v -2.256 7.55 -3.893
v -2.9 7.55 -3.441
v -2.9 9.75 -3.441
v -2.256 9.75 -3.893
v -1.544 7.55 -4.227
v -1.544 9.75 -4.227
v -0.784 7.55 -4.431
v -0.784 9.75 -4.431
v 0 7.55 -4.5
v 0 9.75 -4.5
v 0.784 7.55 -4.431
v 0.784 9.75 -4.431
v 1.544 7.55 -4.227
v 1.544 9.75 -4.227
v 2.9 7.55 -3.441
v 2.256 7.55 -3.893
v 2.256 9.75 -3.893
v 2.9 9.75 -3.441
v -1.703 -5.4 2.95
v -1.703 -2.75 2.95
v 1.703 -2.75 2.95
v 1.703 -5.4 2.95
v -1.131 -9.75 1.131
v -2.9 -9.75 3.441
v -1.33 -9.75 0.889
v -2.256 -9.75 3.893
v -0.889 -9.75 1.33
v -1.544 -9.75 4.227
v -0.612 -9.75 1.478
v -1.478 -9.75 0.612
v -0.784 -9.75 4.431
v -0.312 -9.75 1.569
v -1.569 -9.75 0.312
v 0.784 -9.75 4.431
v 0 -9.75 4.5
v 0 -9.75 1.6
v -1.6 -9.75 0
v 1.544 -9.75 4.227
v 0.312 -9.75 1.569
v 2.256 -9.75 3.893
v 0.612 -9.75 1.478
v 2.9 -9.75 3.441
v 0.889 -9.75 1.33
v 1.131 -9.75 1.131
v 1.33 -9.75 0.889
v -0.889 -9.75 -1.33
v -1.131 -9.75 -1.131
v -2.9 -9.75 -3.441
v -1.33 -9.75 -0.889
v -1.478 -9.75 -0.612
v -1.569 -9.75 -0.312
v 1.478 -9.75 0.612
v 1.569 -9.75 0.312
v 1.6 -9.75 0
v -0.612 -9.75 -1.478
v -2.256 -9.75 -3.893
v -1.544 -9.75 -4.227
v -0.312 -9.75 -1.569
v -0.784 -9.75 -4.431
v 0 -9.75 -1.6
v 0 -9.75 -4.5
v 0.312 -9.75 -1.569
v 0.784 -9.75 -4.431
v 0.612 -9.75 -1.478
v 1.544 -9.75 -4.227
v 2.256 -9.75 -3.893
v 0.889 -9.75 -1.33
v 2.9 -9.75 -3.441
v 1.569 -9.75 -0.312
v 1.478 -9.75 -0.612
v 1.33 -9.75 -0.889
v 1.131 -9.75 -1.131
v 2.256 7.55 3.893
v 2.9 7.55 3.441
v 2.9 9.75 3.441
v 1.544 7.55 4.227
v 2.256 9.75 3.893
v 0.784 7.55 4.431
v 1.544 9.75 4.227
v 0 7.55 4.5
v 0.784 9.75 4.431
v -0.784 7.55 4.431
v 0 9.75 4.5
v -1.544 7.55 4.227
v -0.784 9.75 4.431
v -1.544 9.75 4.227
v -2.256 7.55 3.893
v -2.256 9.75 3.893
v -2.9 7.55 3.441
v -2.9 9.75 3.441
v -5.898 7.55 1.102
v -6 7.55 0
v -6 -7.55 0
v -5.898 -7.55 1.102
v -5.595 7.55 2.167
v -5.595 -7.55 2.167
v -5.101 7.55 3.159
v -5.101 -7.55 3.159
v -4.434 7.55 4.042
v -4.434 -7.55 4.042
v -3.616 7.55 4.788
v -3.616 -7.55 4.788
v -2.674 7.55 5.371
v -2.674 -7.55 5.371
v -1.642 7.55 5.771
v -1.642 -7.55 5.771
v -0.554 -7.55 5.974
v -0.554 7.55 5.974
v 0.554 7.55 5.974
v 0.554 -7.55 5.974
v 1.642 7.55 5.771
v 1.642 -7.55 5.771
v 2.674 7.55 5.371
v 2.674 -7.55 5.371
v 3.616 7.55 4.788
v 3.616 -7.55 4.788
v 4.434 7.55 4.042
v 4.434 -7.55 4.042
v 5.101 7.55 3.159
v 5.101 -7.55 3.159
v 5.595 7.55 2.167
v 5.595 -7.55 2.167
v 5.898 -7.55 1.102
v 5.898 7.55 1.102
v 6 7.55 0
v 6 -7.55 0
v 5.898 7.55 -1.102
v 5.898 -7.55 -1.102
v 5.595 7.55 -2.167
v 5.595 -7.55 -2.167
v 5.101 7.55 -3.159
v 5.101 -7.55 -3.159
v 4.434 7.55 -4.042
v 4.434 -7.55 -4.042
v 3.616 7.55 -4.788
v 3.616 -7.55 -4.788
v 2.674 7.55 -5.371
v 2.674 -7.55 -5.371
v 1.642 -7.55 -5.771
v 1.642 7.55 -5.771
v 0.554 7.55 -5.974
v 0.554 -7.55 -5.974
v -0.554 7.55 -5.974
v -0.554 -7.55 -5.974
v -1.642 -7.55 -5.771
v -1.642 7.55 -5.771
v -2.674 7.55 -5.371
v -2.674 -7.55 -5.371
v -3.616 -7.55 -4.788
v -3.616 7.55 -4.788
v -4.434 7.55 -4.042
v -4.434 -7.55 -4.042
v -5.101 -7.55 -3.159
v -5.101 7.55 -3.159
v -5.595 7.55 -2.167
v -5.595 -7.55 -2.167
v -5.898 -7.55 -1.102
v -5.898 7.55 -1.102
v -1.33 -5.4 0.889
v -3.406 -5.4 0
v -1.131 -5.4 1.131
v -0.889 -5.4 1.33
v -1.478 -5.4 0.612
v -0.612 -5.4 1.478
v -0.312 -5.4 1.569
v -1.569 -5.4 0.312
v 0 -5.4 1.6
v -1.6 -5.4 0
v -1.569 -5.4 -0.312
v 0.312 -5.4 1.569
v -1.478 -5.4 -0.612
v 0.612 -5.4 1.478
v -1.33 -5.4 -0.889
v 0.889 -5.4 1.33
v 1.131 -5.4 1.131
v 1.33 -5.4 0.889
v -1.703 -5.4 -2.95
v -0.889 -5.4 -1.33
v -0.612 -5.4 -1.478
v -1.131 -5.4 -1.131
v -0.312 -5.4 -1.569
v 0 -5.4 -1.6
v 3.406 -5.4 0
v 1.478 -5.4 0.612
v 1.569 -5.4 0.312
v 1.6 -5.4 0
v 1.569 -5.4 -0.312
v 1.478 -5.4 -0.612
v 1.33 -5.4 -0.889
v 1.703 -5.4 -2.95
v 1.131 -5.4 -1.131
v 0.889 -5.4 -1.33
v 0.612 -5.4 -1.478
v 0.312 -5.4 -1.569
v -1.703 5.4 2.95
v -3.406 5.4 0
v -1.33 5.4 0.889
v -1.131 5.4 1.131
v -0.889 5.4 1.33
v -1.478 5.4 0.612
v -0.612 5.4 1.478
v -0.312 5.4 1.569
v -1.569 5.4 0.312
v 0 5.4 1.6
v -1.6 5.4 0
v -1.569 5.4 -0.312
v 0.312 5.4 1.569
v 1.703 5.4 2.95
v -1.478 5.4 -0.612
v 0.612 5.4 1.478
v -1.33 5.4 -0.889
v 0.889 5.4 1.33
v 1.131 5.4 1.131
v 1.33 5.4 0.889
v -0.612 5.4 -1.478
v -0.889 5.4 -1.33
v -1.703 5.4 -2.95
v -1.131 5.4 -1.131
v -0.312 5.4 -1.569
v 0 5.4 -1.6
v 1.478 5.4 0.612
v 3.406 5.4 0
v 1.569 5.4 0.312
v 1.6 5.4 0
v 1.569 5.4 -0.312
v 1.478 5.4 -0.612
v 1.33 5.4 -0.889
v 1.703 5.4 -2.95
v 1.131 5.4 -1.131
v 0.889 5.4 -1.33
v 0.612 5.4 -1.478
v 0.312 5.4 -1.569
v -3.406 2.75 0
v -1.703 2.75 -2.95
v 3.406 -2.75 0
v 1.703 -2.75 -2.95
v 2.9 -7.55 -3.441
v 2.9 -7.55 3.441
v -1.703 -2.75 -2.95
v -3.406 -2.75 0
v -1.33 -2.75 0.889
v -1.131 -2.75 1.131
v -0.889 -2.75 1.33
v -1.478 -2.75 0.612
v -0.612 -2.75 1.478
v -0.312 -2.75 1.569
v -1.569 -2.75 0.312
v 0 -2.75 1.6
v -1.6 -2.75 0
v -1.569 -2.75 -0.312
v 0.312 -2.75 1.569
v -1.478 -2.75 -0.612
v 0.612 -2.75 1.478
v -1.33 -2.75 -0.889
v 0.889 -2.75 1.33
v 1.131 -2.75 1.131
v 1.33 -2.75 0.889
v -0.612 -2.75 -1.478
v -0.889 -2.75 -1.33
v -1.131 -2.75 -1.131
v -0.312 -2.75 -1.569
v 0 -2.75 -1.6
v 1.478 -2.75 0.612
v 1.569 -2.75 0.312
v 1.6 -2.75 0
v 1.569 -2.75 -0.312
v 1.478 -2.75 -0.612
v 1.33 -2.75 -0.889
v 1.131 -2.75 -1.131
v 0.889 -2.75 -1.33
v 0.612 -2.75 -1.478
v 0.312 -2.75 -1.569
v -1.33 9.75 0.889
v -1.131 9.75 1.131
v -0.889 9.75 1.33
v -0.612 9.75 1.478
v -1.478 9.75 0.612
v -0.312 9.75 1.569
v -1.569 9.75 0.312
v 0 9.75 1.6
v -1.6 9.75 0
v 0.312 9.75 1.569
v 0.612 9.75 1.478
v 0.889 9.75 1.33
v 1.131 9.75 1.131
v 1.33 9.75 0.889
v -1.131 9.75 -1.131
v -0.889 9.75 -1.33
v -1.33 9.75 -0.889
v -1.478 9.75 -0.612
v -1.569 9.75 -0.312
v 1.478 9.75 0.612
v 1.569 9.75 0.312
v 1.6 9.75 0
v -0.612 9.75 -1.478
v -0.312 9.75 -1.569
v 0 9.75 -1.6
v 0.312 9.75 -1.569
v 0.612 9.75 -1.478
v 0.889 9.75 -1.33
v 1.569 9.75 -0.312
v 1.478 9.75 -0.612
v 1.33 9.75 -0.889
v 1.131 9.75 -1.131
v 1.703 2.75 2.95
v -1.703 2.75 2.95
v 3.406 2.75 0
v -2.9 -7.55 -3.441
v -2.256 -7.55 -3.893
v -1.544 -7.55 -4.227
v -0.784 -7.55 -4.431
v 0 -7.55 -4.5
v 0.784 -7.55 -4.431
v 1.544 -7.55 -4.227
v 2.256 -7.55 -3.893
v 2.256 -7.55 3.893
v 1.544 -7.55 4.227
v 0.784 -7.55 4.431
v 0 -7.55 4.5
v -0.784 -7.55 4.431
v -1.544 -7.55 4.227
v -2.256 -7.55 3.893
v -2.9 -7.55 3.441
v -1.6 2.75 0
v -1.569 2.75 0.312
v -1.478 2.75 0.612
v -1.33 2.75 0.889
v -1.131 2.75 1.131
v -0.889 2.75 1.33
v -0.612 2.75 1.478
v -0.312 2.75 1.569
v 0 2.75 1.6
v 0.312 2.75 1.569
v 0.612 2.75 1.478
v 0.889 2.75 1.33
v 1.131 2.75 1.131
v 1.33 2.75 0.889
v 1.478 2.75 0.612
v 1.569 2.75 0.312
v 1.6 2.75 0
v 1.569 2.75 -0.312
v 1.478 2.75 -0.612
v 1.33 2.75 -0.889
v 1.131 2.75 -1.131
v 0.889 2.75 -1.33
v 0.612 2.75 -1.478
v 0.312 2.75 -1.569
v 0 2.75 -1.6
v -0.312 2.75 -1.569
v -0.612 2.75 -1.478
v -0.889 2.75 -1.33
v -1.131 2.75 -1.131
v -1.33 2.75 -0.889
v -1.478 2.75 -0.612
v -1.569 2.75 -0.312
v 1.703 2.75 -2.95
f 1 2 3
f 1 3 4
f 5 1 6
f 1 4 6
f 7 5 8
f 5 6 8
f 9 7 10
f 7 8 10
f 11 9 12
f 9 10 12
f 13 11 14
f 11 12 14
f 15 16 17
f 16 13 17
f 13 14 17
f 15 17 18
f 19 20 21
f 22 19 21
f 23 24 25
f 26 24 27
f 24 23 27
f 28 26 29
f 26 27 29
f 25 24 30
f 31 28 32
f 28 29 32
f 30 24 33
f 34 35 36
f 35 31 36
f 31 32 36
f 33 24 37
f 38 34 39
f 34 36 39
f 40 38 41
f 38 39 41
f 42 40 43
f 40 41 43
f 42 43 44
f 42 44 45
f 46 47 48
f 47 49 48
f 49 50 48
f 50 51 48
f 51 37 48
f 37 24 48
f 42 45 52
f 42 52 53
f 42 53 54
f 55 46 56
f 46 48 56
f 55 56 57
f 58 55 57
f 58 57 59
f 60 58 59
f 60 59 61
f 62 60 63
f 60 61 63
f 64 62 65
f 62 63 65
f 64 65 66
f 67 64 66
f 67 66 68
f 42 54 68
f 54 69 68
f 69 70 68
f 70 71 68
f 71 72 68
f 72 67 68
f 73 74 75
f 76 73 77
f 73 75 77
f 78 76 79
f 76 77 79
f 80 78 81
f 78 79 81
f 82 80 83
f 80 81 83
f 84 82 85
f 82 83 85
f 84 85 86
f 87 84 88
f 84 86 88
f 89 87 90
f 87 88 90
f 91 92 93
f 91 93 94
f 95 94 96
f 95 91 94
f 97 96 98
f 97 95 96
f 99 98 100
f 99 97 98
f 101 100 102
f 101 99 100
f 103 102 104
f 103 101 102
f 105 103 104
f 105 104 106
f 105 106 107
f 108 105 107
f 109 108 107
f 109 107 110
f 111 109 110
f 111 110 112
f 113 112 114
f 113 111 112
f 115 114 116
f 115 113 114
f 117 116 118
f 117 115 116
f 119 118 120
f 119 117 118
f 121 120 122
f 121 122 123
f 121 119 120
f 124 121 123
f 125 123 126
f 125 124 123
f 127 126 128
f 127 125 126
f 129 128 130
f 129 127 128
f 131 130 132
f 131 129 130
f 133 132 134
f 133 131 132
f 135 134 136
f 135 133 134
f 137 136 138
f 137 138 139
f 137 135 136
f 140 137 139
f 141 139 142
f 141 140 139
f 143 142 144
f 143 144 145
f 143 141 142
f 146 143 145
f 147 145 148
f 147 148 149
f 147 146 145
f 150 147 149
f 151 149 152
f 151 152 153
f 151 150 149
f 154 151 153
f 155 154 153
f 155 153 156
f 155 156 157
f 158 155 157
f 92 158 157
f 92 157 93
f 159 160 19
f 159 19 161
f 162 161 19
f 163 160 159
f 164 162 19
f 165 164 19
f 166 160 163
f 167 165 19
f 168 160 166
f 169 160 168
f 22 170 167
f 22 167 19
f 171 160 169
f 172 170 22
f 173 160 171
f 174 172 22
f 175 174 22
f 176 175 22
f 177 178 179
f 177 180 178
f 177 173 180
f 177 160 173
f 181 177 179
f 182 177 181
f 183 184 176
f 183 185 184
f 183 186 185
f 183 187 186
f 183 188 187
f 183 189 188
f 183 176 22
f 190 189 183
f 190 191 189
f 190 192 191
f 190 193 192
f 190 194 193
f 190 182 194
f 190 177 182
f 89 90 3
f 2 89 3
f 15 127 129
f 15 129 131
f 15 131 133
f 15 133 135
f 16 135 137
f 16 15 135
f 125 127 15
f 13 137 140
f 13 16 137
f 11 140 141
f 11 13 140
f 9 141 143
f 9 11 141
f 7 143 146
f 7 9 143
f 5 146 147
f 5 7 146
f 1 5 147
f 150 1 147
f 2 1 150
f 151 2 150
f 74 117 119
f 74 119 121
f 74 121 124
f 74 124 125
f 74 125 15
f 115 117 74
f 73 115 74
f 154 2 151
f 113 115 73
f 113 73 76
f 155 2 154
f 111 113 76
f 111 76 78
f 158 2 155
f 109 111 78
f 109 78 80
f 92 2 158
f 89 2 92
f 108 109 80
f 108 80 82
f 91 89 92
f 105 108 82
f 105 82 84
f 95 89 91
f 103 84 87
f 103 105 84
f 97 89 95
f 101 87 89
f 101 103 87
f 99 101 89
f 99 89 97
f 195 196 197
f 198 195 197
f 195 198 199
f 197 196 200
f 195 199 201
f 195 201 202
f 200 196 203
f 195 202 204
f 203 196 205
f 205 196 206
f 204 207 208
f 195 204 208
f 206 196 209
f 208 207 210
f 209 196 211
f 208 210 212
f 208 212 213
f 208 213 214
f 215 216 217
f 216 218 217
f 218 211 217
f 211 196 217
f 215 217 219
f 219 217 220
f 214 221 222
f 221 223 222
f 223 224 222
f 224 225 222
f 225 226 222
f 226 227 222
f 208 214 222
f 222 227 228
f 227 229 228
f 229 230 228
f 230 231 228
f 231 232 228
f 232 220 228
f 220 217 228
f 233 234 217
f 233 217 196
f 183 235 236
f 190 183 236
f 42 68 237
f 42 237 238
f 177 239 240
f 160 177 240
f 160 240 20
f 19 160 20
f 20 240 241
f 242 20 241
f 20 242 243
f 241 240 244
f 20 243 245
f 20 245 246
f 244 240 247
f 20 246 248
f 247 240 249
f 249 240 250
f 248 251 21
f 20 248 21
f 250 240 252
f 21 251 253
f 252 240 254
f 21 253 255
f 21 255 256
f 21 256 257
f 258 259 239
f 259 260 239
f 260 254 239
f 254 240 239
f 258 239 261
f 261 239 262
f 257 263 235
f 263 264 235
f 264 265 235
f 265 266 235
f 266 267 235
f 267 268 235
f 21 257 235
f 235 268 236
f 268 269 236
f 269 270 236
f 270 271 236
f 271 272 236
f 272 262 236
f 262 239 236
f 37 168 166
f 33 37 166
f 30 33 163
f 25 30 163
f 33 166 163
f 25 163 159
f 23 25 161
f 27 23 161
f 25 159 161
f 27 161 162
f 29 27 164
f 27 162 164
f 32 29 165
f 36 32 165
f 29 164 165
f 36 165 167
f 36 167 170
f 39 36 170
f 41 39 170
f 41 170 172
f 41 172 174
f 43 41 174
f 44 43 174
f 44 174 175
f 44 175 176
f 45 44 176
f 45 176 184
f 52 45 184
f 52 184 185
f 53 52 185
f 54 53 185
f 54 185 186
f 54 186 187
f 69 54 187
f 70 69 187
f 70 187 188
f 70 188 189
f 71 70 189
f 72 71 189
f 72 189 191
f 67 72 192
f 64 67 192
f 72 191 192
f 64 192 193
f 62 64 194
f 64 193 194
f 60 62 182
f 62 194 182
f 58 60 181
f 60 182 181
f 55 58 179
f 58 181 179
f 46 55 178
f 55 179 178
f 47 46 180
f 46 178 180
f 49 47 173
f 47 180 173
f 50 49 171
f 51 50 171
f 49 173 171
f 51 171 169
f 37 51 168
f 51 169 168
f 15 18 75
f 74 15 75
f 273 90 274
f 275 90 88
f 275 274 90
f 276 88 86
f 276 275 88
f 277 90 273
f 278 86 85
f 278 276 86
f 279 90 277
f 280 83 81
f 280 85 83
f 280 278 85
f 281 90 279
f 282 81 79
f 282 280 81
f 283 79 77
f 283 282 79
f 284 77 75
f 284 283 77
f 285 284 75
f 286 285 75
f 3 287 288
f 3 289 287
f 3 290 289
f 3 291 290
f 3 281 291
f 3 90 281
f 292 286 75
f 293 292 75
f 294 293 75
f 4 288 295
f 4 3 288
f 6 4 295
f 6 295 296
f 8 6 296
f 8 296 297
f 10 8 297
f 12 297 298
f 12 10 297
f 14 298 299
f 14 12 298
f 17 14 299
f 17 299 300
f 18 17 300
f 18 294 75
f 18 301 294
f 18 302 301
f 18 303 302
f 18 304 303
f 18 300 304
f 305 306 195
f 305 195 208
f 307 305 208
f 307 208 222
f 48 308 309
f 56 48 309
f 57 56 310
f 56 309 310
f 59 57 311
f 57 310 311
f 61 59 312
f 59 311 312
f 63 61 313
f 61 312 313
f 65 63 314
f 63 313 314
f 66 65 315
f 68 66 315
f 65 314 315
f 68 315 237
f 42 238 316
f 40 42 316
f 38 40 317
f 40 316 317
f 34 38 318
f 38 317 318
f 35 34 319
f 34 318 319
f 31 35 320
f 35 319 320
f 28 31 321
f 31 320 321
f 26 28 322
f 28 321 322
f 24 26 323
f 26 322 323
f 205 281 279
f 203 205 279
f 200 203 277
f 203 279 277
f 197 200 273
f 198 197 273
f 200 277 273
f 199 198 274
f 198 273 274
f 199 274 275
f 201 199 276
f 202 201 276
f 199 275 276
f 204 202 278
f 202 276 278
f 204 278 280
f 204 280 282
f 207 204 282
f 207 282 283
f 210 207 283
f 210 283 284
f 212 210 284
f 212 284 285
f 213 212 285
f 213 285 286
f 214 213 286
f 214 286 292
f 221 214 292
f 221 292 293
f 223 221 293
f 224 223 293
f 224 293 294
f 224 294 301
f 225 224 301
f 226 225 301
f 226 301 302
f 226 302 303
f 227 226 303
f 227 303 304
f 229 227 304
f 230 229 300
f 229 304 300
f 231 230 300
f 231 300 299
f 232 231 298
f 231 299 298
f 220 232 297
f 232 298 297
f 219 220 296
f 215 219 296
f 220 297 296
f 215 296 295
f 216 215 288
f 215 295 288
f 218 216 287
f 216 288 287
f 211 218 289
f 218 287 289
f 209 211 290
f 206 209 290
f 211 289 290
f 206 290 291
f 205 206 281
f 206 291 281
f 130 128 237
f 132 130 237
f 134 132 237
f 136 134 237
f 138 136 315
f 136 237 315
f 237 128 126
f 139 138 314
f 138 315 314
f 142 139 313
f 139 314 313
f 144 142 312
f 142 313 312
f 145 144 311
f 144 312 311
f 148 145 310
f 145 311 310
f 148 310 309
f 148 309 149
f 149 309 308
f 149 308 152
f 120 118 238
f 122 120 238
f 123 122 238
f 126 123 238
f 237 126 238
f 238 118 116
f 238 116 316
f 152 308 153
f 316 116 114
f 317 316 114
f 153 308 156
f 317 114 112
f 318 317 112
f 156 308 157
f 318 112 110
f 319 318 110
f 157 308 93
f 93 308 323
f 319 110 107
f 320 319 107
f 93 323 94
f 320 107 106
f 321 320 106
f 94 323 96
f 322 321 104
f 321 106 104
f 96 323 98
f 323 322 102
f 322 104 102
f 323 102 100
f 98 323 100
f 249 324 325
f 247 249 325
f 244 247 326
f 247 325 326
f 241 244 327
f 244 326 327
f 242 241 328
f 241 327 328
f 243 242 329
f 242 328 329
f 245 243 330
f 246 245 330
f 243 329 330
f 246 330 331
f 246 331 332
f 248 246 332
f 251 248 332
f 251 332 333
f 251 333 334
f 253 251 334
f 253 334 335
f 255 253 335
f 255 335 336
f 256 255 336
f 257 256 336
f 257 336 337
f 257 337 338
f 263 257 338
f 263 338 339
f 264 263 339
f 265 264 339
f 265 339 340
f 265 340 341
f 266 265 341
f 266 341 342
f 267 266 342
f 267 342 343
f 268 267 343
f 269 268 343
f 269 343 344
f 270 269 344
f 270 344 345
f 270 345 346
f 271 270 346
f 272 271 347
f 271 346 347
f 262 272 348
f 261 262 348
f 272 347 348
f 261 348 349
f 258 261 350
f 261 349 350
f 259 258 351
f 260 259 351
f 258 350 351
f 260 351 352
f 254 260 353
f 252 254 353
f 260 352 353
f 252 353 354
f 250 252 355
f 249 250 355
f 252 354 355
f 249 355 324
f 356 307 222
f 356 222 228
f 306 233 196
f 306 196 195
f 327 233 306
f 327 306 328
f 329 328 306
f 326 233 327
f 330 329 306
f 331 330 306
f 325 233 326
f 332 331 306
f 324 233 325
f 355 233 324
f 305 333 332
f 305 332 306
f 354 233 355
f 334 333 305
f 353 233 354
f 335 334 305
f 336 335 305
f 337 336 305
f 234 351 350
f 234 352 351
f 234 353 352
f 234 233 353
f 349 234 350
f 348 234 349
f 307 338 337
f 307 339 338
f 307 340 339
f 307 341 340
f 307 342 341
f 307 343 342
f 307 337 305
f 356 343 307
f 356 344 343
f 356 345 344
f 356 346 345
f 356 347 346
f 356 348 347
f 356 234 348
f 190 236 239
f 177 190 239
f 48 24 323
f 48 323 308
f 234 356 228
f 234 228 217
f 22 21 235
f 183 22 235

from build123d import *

# Parameters (mm, degrees)
SKETCH1_W           = 4.5
SKETCH1_H           = 19.5
CUT_EXTRUDE1_DEPTH  = 2.2
SKETCH5_R           = 1.6
CUT_EXTRUDE2_DEPTH  = 21.512191497
CUT_EXTRUDE3_START  = -7
CUT_EXTRUDE3_DEPTH  = 2.65
BOSS_EXTRUDE1_START = -2.2
SKETCH2_3_R         = 6
SKETCH2_3_R_2       = 4.5
BOSS_EXTRUDE1_DEPTH = 15.1


with BuildPart() as part:
    # Sketch1 → Revolve1 (revolve)
    with BuildSketch(Plane.XY, mode=Mode.PRIVATE) as revolve1_sk:
        with Locations((2.25, 0)):
            Rectangle(SKETCH1_W, SKETCH1_H)
    revolve(revolve1_sk.sketch.rotate(Axis((0, 9.75, 0), (0, -1, 0)), 180), axis=Axis((0, 9.75, 0), (0, -1, 0)))

    # Sketch2 → Cut-Extrude1 (cut)
    with BuildSketch(Plane(origin=(0, 9.75, 0), x_dir=(1, 0, 0), z_dir=(0, 1, 0))):
        with BuildLine():
            Line((-2.9, -3.440930107), (-2.9, 3.440930107))
            ThreePointArc((-2.9, 3.440930107), (-4.5, 0), (-2.9, -3.440930107))
        make_face()
        with BuildLine():
            ThreePointArc((4.5, 0), (4.080441153, 1.897366596), (2.9, 3.440930107))
            Line((2.9, 3.440930107), (2.9, -3.440930107))
            ThreePointArc((2.9, -3.440930107), (4.080441153, -1.897366596), (4.5, 0))
        make_face()
    cut_extrude1 = extrude(amount=-CUT_EXTRUDE1_DEPTH, mode=Mode.SUBTRACT)

    # Sketch5 → Cut-Extrude2 (cut, through all)
    with BuildSketch(Plane(origin=(0, 9.75, 0), x_dir=(1, 0, 0), z_dir=(0, 1, 0))):
        with Locations(Location((0, 0, 0), (0, 0, 180))):
            Circle(SKETCH5_R)
    cut_extrude2 = extrude(amount=-CUT_EXTRUDE2_DEPTH, mode=Mode.SUBTRACT)

    # Sketch6 → Cut-Extrude3 (cut)
    with BuildSketch(Plane(origin=(0, 9.75, 0), x_dir=(1, 0, 0), z_dir=(0, 1, 0)).offset(CUT_EXTRUDE3_START)):
        Polygon((3.406366588, 0), (1.703183294, 2.95), (-1.703183294, 2.95), (-1.703183294, -2.95), (1.703183294, -2.95), align=None)
        Polygon((-1.703183294, -2.95), (-1.703183294, 2.95), (-3.406366588, 0), align=None)
    cut_extrude3 = extrude(amount=CUT_EXTRUDE3_DEPTH, mode=Mode.SUBTRACT)

    # Mirror2: Cut-Extrude1, Cut-Extrude2, Cut-Extrude3 across plane
    add(cut_extrude1.mirror(Plane.ZX), mode=Mode.SUBTRACT)
    add(cut_extrude2.mirror(Plane.ZX), mode=Mode.SUBTRACT)
    add(cut_extrude3.mirror(Plane.ZX), mode=Mode.SUBTRACT)

    # Sketch2<3> → Boss-Extrude1 (add)
    with BuildSketch(Plane(origin=(0, 9.75, 0), x_dir=(1, 0, 0), z_dir=(0, 1, 0)).offset(BOSS_EXTRUDE1_START)):
        with Locations(Location((0, 0, 0), (0, 0, 180))):
            Circle(SKETCH2_3_R)
        Circle(SKETCH2_3_R_2, mode=Mode.SUBTRACT)
    extrude(amount=-BOSS_EXTRUDE1_DEPTH)


solid = part.part
